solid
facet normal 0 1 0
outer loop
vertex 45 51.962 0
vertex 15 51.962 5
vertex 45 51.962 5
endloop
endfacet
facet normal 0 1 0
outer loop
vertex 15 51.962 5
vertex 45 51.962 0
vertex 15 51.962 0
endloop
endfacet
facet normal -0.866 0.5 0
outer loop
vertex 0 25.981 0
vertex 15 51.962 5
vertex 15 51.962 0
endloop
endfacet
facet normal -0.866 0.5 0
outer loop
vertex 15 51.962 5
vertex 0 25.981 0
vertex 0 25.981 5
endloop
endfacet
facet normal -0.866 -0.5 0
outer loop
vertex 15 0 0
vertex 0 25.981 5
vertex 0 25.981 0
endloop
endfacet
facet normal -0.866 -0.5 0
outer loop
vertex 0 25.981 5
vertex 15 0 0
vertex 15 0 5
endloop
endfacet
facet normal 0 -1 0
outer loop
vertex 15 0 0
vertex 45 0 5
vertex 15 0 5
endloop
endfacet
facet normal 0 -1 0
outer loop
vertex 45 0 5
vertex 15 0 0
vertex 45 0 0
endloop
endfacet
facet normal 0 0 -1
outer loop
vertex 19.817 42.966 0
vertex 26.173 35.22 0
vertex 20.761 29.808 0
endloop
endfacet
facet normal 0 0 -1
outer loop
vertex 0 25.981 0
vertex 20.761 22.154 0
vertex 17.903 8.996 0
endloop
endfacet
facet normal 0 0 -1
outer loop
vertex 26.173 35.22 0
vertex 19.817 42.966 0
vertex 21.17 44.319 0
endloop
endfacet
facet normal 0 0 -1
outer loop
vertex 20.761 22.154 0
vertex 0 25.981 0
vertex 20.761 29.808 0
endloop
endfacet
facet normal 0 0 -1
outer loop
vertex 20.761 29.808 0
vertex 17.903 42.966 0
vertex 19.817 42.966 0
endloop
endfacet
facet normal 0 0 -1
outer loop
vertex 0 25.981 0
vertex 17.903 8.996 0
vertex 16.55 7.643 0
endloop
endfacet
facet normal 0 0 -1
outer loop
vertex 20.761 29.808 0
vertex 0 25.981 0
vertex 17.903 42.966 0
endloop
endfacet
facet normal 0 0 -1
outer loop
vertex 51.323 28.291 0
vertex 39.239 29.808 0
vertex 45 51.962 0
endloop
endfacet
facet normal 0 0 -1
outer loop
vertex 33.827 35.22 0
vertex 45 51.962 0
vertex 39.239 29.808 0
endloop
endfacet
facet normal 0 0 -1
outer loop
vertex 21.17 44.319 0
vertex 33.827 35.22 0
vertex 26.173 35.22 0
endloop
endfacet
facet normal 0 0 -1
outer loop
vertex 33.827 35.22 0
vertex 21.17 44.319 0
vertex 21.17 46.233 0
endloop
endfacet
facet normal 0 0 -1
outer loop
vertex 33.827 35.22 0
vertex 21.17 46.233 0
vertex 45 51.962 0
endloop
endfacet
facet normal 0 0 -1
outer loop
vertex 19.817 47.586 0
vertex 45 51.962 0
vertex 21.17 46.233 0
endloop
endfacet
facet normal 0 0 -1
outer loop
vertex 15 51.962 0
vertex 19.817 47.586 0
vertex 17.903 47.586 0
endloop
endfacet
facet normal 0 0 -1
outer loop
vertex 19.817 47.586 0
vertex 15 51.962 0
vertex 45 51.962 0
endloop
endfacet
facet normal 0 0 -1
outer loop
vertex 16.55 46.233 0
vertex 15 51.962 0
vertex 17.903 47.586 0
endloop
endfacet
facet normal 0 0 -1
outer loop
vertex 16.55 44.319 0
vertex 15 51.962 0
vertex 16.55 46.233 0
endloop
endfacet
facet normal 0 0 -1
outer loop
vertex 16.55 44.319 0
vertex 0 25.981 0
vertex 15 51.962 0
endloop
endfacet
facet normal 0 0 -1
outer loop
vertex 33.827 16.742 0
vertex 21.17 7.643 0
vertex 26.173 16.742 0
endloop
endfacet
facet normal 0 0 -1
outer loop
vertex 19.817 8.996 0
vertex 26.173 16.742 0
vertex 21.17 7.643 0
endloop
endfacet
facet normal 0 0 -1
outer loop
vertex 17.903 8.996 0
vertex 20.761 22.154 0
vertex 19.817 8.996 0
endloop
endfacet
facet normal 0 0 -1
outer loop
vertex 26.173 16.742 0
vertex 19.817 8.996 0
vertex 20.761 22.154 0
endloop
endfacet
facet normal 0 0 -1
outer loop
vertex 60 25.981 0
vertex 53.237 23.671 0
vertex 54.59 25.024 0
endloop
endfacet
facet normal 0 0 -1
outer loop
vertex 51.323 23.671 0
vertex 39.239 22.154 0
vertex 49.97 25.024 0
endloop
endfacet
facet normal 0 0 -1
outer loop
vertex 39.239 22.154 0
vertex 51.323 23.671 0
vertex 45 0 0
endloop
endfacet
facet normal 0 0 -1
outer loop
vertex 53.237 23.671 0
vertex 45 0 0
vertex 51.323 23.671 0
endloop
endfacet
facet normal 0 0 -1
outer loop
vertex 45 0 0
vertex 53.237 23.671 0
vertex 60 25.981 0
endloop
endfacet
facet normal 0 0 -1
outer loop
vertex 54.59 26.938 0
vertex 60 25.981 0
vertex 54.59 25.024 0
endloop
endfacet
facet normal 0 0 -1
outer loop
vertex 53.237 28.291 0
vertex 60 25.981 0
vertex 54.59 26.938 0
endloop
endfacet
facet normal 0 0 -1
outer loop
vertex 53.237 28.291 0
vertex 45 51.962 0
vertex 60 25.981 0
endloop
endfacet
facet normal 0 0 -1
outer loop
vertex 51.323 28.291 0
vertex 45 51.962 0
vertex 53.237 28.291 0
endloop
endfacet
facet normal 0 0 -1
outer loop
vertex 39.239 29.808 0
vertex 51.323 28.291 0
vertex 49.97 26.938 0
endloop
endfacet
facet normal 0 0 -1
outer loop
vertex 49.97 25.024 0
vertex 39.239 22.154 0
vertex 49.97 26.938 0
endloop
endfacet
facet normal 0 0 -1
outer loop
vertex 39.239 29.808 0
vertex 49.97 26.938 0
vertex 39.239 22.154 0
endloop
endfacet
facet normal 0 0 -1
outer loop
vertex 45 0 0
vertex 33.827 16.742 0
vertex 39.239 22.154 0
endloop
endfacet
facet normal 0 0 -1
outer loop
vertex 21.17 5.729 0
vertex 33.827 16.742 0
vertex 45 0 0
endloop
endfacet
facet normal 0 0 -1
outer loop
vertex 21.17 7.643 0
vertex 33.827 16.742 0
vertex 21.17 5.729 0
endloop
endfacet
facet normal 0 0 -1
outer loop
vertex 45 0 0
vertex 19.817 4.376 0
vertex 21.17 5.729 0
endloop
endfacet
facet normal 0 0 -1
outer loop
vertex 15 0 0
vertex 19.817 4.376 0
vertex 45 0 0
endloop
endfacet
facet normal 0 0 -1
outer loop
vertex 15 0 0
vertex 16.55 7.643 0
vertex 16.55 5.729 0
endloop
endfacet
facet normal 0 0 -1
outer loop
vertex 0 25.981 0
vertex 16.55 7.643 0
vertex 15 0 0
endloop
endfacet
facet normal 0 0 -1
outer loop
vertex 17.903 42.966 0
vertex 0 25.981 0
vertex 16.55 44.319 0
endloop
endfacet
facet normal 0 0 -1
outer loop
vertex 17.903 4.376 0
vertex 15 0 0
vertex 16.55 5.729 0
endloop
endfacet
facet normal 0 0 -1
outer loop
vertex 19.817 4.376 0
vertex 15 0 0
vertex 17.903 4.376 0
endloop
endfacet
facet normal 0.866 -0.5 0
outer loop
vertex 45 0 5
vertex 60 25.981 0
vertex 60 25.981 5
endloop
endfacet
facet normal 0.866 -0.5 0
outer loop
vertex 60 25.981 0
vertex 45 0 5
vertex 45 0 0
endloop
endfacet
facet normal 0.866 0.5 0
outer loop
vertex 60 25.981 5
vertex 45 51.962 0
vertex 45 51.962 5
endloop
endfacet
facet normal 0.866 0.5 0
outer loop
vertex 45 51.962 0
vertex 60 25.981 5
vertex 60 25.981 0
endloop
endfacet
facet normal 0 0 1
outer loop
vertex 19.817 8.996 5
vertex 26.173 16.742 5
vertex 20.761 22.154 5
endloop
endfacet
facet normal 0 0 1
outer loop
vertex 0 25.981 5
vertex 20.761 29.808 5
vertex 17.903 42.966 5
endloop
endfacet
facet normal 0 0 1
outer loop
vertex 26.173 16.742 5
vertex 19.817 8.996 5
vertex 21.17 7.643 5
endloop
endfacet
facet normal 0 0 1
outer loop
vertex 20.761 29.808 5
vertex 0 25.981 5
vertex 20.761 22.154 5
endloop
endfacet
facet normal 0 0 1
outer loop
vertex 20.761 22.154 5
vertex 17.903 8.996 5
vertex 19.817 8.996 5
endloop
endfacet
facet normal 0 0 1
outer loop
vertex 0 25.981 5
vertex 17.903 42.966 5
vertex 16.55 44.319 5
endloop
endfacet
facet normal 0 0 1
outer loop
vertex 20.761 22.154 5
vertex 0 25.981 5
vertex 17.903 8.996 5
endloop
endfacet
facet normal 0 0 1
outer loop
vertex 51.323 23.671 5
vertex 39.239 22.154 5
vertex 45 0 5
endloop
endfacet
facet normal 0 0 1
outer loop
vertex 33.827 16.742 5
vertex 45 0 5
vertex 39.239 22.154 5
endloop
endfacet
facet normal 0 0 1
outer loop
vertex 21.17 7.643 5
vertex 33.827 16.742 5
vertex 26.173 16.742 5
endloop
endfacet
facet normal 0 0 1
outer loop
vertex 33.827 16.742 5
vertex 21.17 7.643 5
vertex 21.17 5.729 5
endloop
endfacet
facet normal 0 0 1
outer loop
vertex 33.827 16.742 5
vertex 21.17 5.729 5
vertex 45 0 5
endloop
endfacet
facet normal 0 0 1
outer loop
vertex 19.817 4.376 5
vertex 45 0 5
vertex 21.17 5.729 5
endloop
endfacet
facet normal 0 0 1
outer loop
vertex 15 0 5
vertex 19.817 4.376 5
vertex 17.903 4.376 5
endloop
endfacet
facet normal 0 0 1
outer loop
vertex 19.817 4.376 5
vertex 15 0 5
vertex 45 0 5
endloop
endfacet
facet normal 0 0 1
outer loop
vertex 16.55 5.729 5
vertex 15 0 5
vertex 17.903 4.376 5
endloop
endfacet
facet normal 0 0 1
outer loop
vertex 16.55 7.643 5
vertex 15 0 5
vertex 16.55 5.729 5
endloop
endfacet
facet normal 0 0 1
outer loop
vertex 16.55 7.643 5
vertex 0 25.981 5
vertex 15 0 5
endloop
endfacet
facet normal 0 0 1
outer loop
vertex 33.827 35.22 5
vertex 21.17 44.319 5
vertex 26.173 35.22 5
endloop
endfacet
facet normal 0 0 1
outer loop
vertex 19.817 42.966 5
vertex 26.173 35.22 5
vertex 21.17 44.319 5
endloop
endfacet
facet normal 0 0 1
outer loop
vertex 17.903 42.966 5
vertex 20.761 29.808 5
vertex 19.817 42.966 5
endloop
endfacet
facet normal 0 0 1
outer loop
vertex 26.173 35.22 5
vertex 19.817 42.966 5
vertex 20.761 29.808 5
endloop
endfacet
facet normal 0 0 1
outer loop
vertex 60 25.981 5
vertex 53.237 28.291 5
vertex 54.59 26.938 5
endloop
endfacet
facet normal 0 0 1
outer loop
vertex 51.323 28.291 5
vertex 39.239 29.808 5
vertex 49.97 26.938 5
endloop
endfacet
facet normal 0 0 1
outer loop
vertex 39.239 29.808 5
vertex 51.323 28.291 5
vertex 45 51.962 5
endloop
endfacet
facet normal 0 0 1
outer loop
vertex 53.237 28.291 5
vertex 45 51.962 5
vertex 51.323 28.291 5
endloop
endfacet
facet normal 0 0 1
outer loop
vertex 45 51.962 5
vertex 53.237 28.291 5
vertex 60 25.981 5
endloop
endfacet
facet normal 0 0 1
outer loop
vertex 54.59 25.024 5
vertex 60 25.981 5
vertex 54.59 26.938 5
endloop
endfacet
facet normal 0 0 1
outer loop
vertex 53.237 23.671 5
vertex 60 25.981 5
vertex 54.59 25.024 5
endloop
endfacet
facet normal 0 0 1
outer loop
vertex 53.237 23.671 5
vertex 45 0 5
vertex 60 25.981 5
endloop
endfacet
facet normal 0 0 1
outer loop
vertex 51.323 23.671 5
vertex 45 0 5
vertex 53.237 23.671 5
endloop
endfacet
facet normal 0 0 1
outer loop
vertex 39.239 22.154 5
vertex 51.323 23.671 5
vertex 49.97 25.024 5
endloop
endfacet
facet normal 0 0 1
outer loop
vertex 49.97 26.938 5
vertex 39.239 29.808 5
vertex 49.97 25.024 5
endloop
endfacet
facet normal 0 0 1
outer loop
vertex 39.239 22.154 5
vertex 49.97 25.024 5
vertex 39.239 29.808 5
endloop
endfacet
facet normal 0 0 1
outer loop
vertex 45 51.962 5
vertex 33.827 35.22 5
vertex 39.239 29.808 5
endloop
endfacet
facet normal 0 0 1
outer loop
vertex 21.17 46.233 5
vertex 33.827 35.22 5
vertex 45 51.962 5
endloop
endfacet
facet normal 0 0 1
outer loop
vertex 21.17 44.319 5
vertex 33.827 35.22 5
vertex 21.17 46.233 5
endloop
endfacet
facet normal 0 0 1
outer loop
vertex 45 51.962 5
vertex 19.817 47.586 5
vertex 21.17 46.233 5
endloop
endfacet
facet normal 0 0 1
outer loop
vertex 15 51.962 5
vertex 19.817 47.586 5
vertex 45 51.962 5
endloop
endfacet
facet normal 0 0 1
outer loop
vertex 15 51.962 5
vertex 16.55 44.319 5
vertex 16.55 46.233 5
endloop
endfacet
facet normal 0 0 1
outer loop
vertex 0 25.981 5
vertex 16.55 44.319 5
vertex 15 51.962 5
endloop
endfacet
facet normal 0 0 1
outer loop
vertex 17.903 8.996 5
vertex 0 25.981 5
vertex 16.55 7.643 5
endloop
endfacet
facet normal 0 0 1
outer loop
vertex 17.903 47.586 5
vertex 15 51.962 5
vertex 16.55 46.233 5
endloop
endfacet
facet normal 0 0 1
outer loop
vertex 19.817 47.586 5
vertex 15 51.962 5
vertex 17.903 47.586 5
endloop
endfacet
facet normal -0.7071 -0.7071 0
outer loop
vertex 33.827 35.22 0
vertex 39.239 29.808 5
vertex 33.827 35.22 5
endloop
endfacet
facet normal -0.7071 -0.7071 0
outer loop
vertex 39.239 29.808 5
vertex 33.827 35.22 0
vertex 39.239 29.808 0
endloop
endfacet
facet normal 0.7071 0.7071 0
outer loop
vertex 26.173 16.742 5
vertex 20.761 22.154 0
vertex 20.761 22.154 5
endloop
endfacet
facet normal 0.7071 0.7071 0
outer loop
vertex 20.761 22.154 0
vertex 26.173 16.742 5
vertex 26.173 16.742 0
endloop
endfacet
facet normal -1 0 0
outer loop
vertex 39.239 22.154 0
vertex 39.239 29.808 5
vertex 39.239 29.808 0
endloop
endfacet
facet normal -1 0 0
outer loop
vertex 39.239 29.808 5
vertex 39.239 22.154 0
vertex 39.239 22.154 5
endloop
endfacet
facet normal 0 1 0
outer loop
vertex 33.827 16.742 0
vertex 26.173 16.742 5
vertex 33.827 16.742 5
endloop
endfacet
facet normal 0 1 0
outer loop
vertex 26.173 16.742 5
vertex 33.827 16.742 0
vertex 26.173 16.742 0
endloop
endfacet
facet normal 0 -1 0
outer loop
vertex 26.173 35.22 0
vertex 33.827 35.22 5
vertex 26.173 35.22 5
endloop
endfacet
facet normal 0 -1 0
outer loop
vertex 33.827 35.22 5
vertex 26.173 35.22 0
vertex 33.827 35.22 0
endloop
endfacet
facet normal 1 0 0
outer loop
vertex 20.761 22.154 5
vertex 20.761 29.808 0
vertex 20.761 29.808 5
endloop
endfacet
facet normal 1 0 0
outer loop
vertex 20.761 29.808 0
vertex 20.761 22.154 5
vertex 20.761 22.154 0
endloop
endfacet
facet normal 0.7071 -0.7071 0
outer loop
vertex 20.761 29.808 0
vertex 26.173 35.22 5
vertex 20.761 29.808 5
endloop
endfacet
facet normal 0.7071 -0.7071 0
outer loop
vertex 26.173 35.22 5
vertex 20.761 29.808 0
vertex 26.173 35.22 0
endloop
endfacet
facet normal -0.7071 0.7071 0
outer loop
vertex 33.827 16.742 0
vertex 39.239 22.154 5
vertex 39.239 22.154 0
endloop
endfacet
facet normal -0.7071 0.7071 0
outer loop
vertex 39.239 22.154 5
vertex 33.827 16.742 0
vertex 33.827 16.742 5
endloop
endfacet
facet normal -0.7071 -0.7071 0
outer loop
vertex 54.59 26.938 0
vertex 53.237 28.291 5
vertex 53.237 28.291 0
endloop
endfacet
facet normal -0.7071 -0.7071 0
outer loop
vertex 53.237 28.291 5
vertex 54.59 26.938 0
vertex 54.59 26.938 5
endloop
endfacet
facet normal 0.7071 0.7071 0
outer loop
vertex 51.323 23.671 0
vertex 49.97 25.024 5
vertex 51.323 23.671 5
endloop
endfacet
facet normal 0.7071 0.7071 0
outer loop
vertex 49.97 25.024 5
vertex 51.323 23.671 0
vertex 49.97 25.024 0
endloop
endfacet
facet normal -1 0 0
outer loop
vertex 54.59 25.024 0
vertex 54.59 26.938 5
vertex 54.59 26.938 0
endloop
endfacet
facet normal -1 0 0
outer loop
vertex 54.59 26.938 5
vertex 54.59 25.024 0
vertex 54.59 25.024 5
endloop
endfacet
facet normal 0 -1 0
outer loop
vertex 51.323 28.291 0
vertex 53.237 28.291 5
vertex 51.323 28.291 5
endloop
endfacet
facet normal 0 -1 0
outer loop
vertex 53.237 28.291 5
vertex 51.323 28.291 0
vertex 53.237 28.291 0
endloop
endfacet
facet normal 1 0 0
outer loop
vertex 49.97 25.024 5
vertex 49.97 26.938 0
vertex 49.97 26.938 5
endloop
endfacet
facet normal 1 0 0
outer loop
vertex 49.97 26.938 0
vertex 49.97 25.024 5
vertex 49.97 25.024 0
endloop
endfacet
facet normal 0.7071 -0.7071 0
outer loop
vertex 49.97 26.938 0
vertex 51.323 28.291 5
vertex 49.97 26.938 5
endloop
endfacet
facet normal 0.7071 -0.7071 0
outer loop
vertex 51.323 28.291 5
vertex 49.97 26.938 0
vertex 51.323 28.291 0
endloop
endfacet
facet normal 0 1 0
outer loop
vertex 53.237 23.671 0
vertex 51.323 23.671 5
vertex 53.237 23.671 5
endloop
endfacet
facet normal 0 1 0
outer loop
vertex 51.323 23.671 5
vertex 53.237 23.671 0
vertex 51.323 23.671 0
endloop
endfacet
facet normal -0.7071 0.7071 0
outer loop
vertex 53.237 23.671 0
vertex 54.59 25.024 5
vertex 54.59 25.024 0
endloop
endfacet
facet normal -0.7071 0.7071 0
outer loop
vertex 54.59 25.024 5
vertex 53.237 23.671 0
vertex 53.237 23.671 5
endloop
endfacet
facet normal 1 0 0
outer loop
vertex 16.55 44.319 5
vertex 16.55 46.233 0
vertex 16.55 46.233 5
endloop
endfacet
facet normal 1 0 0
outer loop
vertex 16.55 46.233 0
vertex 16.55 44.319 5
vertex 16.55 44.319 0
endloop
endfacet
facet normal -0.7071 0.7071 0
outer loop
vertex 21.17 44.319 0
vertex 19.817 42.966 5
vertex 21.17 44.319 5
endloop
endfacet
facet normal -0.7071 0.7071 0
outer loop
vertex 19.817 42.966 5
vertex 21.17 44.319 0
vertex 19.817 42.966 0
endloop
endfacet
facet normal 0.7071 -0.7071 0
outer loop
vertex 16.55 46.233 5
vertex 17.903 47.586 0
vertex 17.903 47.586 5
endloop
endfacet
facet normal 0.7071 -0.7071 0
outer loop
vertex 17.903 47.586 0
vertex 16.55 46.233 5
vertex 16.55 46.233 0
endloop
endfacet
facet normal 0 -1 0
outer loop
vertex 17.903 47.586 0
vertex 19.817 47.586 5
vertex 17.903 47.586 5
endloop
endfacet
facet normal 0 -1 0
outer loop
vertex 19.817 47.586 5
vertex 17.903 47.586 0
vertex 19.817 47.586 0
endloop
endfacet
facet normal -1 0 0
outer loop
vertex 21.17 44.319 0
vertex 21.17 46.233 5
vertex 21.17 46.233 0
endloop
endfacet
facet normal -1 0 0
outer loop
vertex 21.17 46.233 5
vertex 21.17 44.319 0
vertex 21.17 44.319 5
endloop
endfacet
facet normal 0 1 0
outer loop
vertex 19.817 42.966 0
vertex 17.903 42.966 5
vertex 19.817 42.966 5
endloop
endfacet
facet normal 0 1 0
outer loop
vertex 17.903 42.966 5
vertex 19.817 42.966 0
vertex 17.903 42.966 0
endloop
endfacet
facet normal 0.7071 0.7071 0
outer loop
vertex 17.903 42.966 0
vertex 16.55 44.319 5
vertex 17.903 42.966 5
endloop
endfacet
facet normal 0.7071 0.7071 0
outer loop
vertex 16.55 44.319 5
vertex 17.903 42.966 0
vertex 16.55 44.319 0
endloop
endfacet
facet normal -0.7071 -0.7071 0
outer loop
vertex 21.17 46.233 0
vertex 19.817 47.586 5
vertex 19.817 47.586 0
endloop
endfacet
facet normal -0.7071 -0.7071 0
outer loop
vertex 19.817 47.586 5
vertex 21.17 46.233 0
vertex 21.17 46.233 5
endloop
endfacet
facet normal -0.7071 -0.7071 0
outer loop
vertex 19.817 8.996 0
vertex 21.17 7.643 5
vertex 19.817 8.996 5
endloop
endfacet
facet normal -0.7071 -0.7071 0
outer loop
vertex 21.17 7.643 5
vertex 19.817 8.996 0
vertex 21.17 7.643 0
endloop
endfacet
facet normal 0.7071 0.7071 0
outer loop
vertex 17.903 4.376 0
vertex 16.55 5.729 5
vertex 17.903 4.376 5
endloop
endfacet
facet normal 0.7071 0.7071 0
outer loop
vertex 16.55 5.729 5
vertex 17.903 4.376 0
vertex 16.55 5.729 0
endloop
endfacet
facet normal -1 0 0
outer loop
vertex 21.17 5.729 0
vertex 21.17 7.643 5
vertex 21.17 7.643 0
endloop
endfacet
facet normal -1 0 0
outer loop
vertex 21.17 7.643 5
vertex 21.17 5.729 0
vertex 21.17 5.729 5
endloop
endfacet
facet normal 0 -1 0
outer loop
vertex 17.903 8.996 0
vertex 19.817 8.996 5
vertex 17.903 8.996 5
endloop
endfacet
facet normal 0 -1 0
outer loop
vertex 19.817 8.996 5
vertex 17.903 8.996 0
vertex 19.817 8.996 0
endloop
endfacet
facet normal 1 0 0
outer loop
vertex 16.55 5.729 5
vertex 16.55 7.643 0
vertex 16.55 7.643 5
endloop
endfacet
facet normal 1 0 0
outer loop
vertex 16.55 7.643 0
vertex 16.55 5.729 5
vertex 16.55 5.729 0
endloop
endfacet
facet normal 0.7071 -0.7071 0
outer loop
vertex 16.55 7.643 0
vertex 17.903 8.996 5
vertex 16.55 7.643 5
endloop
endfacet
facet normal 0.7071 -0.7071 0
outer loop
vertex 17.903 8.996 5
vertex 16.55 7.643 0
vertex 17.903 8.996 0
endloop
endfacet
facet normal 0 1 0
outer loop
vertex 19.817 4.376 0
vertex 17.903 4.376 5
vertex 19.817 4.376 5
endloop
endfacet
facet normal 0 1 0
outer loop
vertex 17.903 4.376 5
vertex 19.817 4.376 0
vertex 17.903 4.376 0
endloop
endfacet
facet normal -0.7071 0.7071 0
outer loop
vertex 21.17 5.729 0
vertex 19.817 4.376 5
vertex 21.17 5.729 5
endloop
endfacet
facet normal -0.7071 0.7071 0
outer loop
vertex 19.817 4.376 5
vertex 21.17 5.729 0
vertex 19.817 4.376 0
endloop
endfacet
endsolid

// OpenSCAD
$fn = 32;

// ----------------------------------------------------------------------
// Polygon plate: 6-gon R30, 3 bolt windows
// ----------------------------------------------------------------------

// --- parameters (mm) ---
sides = 6;                // number of polygon sides
plate_r = 30;             // circumscribed radius of the polygon
bore_r = 10;              // centre bore radius
bolts = 3;                // number of bolt windows
ring_r = 22.28;           // bolt-circle radius
bolt_r = 2.5;             // bolt window radius
plate_t = 5;              // plate thickness, Z (extrusion height)

plate_d = 2 * plate_r;  // circumscribed diameter
bore_d = 2 * bore_r;  // centre bore diameter
bolt_d = 2 * bolt_r;  // bolt window diameter
ring_d = 2 * ring_r;  // bolt-circle diameter

profile = [[60, 25.981], [45, 51.962], [15, 51.962], [0, 25.981], [15, 0], [45, 0]];  // primary outline, 6 points, counter clockwise
void_1 = [[39.239, 29.808], [33.827, 35.22], [26.173, 35.22], [20.761, 29.808], [20.761, 22.154], [26.173, 16.742], [33.827, 16.742], [39.239, 22.154]];  // centre bore, 8 points
void_2 = [[54.59, 26.938], [53.237, 28.291], [51.323, 28.291], [49.97, 26.938], [49.97, 25.024], [51.323, 23.671], [53.237, 23.671], [54.59, 25.024]];  // bolt window 1, 8 points
void_3 = [[21.17, 46.233], [19.817, 47.586], [17.903, 47.586], [16.55, 46.233], [16.55, 44.319], [17.903, 42.966], [19.817, 42.966], [21.17, 44.319]];  // bolt window 2, 8 points
void_4 = [[21.17, 7.643], [19.817, 8.996], [17.903, 8.996], [16.55, 7.643], [16.55, 5.729], [17.903, 4.376], [19.817, 4.376], [21.17, 5.729]];  // bolt window 3, 8 points

// --- the one profile operation ---
difference() {
  linear_extrude(height = plate_t) polygon(points = profile);
  translate([0, 0, -1])
    linear_extrude(height = plate_t + 2) polygon(points = void_1);
  translate([0, 0, -1])
    linear_extrude(height = plate_t + 2) polygon(points = void_2);
  translate([0, 0, -1])
    linear_extrude(height = plate_t + 2) polygon(points = void_3);
  translate([0, 0, -1])
    linear_extrude(height = plate_t + 2) polygon(points = void_4);
}
